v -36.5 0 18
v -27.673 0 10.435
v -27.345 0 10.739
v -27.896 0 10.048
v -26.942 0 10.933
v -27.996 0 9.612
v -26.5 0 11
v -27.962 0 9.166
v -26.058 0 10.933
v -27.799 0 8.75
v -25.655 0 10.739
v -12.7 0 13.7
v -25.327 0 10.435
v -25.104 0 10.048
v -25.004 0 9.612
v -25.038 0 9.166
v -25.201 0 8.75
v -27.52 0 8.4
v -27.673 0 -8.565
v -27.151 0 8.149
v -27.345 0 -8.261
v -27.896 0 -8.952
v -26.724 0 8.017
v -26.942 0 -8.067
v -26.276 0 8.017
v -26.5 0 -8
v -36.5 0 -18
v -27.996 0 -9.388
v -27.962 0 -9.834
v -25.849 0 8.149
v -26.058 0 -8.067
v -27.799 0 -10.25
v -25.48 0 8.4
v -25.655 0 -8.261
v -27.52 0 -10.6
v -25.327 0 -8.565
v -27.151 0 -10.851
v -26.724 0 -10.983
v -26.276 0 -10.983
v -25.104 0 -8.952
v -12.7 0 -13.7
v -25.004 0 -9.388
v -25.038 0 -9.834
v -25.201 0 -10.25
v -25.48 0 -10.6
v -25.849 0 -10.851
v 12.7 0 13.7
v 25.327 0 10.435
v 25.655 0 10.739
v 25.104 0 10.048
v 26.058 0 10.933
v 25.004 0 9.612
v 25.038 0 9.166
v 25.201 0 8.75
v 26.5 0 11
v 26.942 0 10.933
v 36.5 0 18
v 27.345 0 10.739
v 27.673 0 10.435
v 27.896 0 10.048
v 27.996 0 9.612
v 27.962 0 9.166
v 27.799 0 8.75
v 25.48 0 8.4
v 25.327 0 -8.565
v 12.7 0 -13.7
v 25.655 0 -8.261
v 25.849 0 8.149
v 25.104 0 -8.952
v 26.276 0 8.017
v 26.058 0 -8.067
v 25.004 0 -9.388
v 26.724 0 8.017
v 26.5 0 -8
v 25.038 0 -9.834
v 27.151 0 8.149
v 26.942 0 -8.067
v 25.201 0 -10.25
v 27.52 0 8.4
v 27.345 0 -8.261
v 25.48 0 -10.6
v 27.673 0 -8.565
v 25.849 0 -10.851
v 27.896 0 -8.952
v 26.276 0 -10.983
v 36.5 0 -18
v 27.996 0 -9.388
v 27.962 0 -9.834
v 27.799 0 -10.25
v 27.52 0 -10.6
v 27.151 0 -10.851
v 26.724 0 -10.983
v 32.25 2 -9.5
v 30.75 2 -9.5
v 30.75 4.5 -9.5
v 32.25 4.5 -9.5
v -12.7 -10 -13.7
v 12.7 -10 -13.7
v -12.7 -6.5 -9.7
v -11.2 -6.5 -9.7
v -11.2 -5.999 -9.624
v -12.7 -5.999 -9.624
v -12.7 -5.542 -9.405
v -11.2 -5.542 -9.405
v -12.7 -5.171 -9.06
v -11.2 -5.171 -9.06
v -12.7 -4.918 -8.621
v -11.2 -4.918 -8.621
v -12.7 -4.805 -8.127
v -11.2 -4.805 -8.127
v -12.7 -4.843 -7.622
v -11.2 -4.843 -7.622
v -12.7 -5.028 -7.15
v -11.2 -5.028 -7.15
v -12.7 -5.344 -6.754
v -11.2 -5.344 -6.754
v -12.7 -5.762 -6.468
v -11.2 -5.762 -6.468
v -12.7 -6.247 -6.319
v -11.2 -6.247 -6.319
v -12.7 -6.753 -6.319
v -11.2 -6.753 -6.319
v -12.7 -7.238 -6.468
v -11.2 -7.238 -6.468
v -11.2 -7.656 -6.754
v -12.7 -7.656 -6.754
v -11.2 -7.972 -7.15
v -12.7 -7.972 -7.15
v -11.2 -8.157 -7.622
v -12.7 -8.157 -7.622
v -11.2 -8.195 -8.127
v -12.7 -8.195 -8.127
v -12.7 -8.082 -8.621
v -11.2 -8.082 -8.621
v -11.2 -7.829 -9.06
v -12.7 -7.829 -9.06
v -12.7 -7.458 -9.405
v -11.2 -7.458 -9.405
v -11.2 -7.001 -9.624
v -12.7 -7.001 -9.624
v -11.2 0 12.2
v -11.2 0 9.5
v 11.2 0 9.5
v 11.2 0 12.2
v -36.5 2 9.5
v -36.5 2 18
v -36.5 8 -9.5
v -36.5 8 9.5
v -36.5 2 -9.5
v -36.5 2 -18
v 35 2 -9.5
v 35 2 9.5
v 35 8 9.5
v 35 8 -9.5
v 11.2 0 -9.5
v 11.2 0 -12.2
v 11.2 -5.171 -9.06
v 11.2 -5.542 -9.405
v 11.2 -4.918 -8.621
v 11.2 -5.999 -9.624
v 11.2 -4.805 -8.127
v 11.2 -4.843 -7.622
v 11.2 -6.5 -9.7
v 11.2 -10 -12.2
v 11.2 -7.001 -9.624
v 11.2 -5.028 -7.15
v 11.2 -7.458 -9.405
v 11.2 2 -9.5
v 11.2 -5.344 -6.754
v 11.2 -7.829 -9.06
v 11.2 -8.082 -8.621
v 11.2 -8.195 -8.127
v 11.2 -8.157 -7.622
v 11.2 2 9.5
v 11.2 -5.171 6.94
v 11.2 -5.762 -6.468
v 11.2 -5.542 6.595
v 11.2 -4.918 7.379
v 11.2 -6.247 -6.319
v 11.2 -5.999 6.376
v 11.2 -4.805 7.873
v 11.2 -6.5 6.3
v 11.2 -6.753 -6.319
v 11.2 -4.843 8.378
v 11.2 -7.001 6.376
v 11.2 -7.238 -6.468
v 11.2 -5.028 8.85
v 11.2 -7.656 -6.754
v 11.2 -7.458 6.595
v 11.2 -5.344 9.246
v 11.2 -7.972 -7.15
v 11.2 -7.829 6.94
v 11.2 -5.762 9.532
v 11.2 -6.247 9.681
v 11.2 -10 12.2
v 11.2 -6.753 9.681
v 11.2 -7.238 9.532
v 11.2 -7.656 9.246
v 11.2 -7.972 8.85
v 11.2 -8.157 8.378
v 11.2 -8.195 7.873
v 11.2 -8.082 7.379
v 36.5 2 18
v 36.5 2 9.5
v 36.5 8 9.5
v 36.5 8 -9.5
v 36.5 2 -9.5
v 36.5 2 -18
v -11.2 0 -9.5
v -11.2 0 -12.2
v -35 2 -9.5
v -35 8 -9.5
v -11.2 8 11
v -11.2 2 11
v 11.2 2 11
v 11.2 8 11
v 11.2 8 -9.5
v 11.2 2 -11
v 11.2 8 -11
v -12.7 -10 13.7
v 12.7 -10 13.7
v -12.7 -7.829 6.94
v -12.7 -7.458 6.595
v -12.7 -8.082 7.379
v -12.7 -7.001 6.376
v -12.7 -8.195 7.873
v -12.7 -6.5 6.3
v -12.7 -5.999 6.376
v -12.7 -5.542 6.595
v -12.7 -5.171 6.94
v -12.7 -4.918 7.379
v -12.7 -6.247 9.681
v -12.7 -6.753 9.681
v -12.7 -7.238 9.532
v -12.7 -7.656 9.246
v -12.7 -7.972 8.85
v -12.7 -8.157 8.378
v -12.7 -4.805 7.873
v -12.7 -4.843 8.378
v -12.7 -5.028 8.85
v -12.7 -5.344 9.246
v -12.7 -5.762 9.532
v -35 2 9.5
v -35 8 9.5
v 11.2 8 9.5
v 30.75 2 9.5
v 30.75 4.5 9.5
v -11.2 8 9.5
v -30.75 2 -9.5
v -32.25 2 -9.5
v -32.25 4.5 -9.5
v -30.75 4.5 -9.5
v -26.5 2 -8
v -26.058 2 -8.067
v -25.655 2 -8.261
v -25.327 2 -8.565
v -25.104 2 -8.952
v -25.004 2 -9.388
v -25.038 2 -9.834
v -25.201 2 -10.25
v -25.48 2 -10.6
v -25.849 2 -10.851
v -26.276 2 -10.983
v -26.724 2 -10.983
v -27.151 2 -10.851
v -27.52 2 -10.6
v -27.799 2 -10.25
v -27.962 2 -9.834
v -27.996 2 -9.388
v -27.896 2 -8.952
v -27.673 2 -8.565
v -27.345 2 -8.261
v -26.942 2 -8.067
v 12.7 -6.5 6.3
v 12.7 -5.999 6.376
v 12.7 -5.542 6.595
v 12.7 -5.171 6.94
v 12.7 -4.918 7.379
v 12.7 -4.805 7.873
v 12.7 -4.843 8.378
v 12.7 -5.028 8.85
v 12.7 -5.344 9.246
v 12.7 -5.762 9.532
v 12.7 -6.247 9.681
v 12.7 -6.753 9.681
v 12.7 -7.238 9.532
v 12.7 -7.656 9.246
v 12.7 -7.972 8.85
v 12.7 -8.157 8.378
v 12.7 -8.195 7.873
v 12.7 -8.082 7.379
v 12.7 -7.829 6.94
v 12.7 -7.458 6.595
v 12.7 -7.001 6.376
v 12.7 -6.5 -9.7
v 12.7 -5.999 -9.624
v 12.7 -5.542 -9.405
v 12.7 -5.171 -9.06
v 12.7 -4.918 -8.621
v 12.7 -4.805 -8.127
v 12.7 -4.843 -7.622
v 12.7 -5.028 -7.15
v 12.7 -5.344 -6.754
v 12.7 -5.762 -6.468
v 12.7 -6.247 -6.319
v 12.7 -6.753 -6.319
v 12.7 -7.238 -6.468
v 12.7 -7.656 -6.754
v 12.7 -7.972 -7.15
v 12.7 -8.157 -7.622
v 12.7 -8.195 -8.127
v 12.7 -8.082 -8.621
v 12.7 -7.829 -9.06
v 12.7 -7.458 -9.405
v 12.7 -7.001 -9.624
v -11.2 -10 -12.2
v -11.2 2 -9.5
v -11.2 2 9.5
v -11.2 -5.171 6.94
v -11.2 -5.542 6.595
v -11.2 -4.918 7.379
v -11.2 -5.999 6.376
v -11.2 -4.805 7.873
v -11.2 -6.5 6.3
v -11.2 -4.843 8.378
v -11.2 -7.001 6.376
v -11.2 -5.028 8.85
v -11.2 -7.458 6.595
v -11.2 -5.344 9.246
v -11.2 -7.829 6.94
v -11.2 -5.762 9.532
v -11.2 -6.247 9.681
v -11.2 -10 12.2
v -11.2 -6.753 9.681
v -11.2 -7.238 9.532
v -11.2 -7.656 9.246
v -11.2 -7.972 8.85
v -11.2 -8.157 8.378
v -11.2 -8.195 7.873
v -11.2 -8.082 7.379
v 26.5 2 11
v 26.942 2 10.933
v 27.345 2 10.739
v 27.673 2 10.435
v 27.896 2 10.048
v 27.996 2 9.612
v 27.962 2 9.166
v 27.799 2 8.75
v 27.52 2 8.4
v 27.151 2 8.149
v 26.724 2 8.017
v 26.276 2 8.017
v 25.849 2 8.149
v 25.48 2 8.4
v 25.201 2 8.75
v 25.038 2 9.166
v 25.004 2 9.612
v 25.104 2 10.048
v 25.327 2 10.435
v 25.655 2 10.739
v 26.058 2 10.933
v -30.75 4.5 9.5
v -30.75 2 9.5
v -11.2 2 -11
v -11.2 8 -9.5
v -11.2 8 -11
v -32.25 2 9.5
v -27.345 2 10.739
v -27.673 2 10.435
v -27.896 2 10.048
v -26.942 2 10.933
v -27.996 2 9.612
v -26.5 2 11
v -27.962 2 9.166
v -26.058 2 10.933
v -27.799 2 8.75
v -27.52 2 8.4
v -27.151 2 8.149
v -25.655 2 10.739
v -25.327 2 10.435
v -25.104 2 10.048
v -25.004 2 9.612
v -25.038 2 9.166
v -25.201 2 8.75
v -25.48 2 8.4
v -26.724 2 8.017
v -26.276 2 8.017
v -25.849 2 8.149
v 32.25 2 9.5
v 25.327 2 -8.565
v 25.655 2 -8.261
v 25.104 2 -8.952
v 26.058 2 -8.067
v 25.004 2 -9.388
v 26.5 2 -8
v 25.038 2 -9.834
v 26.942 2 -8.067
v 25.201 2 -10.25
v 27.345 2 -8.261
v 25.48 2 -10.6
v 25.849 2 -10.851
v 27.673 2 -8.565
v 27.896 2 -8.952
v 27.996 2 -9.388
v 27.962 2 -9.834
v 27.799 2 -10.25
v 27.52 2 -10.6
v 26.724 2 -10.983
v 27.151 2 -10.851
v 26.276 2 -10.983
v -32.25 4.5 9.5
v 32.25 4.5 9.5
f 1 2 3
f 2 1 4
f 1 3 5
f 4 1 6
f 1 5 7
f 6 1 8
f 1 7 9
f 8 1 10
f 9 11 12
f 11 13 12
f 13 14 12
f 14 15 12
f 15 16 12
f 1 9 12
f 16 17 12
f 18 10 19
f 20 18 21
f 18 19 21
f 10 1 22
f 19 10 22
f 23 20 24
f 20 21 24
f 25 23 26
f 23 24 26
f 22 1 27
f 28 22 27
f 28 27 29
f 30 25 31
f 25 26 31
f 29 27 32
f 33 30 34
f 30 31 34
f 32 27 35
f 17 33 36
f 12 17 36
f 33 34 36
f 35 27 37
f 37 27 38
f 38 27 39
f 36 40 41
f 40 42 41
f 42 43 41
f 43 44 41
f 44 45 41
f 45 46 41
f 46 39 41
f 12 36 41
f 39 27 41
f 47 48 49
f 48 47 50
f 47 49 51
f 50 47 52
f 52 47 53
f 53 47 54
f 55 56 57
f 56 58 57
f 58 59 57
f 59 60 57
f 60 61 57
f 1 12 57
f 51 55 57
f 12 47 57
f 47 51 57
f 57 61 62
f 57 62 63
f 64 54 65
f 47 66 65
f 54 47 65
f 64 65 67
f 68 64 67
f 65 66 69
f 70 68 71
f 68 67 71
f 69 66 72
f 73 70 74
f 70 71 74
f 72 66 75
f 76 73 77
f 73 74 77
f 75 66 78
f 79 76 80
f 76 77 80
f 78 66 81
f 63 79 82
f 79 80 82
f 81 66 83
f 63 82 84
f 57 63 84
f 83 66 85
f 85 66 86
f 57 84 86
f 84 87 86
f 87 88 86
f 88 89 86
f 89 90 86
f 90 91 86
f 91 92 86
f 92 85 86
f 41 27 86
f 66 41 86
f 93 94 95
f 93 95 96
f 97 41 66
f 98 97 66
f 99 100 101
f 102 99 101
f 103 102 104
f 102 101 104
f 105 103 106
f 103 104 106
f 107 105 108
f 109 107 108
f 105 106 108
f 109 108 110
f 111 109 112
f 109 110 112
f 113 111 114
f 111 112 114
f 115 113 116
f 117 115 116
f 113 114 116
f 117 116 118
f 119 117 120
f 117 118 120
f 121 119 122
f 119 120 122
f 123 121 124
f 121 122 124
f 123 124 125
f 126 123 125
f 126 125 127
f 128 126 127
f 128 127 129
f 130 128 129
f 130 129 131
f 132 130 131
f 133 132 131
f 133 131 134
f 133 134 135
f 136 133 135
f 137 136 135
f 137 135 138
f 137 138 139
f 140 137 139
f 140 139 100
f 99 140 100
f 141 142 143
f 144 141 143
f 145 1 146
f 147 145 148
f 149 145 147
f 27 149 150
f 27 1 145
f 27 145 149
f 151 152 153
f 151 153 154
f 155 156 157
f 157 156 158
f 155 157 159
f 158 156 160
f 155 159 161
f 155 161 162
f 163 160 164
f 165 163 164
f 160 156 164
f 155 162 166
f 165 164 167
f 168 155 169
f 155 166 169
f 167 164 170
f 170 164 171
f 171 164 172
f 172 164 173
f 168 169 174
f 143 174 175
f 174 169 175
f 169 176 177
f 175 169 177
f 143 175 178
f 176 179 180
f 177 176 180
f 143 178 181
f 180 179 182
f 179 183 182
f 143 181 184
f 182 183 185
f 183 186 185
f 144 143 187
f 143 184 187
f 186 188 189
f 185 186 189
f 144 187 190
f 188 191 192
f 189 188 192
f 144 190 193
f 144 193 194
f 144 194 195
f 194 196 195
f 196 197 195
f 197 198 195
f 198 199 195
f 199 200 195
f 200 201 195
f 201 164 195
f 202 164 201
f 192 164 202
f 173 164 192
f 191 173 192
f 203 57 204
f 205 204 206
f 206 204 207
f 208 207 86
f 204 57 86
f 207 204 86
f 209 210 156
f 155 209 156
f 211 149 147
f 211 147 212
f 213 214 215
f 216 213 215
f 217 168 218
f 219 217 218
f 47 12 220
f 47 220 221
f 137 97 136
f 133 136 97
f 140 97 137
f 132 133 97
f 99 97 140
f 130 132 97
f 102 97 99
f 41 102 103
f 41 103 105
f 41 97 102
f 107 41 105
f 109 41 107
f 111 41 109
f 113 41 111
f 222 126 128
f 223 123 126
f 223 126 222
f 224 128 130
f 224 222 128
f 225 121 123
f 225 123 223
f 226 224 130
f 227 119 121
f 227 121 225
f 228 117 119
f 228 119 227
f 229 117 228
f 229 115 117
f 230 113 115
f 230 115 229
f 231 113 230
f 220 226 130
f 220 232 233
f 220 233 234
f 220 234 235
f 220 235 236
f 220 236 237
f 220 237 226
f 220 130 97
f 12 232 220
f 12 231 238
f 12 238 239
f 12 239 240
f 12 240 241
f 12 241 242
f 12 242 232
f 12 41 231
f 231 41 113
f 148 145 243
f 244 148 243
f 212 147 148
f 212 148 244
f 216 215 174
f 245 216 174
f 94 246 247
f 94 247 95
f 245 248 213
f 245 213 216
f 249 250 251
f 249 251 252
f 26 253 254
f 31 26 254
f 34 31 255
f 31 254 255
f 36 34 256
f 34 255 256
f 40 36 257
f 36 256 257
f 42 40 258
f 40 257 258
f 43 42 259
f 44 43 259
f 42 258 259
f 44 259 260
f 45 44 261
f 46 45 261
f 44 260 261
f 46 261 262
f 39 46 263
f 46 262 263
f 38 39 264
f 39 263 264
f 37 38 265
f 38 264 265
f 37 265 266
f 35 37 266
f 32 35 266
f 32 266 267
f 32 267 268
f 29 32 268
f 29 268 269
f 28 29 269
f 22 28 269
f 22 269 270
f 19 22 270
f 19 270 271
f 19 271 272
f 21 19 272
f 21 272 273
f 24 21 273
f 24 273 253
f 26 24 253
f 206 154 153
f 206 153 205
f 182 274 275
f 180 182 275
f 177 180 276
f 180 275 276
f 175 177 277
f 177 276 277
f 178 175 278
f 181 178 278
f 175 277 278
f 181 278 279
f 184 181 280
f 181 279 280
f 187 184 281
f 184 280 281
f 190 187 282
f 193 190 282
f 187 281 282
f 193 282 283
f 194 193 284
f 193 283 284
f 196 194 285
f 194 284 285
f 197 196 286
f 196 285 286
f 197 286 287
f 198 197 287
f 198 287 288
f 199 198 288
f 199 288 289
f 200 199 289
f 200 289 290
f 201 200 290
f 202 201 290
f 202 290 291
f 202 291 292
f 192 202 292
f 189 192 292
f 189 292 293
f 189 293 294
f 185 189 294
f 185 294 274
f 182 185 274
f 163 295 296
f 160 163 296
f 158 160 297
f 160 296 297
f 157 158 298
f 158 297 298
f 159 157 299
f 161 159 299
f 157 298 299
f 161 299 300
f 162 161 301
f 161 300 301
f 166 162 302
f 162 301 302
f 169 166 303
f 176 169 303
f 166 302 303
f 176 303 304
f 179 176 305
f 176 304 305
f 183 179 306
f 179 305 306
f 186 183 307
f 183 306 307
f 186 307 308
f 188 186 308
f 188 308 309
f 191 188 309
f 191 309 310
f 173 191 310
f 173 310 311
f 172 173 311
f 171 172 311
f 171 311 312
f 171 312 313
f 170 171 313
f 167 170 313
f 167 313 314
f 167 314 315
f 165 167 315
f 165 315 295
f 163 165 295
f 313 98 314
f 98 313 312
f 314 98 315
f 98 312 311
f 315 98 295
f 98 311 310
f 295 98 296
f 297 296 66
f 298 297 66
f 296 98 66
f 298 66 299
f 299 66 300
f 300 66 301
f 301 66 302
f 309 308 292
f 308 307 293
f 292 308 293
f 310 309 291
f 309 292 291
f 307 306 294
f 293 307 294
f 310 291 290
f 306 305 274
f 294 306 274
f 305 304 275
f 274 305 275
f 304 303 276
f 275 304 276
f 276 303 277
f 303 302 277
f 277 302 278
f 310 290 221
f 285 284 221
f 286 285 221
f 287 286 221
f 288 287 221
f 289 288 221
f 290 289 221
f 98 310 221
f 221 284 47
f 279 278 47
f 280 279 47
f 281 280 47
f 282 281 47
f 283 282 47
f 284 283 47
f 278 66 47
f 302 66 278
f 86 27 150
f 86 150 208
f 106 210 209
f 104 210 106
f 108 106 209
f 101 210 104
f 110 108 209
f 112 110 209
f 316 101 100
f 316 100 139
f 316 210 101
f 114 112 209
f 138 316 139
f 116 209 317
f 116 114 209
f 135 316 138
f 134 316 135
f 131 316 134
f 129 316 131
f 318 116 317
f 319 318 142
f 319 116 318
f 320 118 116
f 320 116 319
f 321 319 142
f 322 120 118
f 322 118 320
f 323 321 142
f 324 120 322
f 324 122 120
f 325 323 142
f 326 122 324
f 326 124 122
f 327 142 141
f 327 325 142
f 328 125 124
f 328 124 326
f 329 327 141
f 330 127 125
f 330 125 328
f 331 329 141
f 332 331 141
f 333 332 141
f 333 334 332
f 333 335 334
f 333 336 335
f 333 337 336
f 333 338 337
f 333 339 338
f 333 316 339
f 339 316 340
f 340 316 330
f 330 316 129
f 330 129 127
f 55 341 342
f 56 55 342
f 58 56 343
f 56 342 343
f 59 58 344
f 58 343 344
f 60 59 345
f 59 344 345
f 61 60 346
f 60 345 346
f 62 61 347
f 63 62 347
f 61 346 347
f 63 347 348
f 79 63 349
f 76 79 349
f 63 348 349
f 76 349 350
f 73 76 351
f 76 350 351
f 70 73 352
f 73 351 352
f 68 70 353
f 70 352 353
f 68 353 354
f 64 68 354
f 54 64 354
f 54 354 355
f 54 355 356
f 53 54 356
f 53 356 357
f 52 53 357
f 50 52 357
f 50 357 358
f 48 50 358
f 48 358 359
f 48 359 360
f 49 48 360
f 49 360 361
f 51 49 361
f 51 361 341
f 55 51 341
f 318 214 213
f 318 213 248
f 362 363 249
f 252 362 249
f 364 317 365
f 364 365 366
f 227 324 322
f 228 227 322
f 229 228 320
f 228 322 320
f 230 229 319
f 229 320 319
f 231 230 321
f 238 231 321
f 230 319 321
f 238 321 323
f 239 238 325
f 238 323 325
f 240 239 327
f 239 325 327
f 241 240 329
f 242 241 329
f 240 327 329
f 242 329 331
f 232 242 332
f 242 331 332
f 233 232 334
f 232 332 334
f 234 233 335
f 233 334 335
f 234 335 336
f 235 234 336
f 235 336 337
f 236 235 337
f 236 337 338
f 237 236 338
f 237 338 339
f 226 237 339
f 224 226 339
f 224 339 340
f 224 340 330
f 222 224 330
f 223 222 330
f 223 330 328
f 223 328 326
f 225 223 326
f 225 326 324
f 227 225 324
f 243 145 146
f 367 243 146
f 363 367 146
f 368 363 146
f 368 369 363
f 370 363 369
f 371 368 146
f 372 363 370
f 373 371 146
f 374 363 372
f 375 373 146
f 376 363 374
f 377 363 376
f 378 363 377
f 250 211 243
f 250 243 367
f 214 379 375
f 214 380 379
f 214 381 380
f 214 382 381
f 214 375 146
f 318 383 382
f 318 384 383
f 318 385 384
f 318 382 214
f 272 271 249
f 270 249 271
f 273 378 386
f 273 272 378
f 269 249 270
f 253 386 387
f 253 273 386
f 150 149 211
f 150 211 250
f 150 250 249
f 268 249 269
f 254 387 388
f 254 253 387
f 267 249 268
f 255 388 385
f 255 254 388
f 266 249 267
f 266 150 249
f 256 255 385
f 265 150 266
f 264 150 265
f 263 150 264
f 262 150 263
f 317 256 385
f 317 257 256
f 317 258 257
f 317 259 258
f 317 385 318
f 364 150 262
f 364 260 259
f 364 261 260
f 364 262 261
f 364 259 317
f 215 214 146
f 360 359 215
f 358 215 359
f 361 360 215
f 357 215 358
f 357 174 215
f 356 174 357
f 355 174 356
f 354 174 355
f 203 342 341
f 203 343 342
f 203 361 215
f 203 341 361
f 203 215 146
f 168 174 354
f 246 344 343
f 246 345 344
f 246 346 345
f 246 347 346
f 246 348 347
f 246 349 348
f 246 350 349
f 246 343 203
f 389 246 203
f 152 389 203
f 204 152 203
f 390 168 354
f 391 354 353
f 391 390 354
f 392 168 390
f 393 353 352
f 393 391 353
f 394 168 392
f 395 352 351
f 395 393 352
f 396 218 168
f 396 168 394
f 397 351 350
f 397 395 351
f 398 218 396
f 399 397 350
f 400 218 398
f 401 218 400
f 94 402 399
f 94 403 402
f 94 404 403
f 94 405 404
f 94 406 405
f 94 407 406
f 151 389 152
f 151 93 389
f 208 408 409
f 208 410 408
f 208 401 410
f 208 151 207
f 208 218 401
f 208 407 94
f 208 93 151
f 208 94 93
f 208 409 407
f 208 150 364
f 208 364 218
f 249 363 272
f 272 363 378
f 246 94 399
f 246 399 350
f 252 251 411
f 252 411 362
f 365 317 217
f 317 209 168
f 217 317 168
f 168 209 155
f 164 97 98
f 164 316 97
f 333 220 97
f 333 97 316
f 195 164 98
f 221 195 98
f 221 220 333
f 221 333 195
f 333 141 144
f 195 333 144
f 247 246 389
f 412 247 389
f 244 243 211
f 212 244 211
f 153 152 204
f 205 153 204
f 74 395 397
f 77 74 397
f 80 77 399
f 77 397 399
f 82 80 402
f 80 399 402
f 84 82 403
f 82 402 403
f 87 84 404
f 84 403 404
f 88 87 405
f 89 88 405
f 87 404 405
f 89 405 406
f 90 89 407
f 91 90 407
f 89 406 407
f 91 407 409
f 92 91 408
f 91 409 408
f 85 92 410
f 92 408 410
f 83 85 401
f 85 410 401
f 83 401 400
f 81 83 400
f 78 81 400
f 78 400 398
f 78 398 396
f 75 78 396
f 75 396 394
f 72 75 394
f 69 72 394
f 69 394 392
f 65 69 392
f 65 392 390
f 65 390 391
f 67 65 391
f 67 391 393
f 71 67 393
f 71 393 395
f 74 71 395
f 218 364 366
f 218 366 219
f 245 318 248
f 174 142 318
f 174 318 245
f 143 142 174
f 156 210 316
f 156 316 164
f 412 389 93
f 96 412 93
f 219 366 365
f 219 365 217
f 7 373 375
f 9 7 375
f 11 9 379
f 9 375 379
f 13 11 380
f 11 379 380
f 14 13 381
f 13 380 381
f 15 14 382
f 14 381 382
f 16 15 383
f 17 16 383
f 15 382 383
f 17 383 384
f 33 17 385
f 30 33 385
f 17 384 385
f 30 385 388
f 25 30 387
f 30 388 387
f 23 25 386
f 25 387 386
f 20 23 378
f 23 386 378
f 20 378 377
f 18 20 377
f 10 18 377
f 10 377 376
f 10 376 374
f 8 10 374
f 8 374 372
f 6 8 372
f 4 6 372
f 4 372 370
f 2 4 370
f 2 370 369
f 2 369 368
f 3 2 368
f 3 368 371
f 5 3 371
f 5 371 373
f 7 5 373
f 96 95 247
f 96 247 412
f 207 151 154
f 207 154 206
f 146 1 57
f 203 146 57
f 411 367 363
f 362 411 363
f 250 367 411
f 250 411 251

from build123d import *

# Parameters (mm, degrees)
SKETCH1_W           = 73
SKETCH1_H           = 36
BOSS_EXTRUDE1_DEPTH = 2
SKETCH2_W           = 1.5
SKETCH2_H           = 19
BOSS_EXTRUDE2_DEPTH = 6
SKETCH3_W           = 25.4
SKETCH3_H           = 27.4
SKETCH3_W_2         = 22.4
SKETCH3_H_2         = 24.4
BOSS_EXTRUDE3_DEPTH = 10
SKETCH4_W           = 22.4
SKETCH4_H           = 19
CUT_EXTRUDE1_DEPTH  = 42.907636536
SKETCH5_W           = 22.4
SKETCH5_H           = 1.5
BOSS_EXTRUDE4_DEPTH = 6
SKETCH6_R           = 1.5
CUT_EXTRUDE2_DEPTH  = 43.429353047
SKETCH7_W           = 1.5
SKETCH7_H           = 19
BOSS_EXTRUDE5_DEPTH = 2.5
SKETCH8_R           = 1.7
CUT_EXTRUDE3_DEPTH  = 54.335166635


with BuildPart() as part:
    # Sketch1 → Boss-Extrude1 (new body)
    with BuildSketch(Plane(origin=(0, 0, 0), x_dir=(1, 0, 0), z_dir=(0, 1, 0))):
        Rectangle(SKETCH1_W, SKETCH1_H)
    extrude(amount=BOSS_EXTRUDE1_DEPTH)

    # Sketch2 → Boss-Extrude2 (add)
    with BuildSketch(Plane(origin=(0, 2, 0), x_dir=(1, 0, 0), z_dir=(0, 1, 0))):
        with Locations((-35.75, 0)):
            Rectangle(SKETCH2_W, SKETCH2_H)
        with Locations((35.75, 0)):
            Rectangle(SKETCH2_W, SKETCH2_H)
    extrude(amount=BOSS_EXTRUDE2_DEPTH)

    # Sketch3 → Boss-Extrude3 (add)
    with BuildSketch(Plane.XZ):
        Rectangle(SKETCH3_W, SKETCH3_H)
        Rectangle(SKETCH3_W_2, SKETCH3_H_2, mode=Mode.SUBTRACT)
    extrude(amount=BOSS_EXTRUDE3_DEPTH)

    # Sketch4 → Cut-Extrude1 (cut, through all)
    with BuildSketch(Plane.XZ):
        Rectangle(SKETCH4_W, SKETCH4_H)
    extrude(amount=-CUT_EXTRUDE1_DEPTH, mode=Mode.SUBTRACT)

    # Sketch5 → Boss-Extrude4 (add)
    with BuildSketch(Plane(origin=(0, 2, 0), x_dir=(1, 0, 0), z_dir=(0, 1, 0))):
        with Locations((0, 10.25)):
            Rectangle(SKETCH5_W, SKETCH5_H)
        with Locations((0, -10.25)):
            Rectangle(SKETCH5_W, SKETCH5_H)
    extrude(amount=BOSS_EXTRUDE4_DEPTH)

    # Sketch6 → Cut-Extrude2 (cut, through all)
    with BuildSketch(Plane(origin=(0, 2, 0), x_dir=(1, 0, 0), z_dir=(0, 1, 0))):
        with Locations(Location((-26.5, 9.5, 0), (0, 0, 270))):
            Circle(SKETCH6_R)
        with Locations(Location((-26.5, -9.5, 0), (0, 0, 270))):
            Circle(SKETCH6_R)
        with Locations(Location((26.5, 9.5, 0), (0, 0, 270))):
            Circle(SKETCH6_R)
        with Locations(Location((26.5, -9.5, 0), (0, 0, 270))):
            Circle(SKETCH6_R)
    extrude(amount=-CUT_EXTRUDE2_DEPTH, mode=Mode.SUBTRACT)

    # Sketch7 → Boss-Extrude5 (add)
    with BuildSketch(Plane(origin=(0, 2, 0), x_dir=(1, 0, 0), z_dir=(0, 1, 0))):
        with Locations((-31.5, 0)):
            Rectangle(SKETCH7_W, SKETCH7_H)
        with Locations((31.5, 0)):
            Rectangle(SKETCH7_W, SKETCH7_H)
    extrude(amount=BOSS_EXTRUDE5_DEPTH)

    # Sketch8 → Cut-Extrude3 (cut, through all)
    with BuildSketch(Plane(origin=(12.7, 0, 0), x_dir=(0, 0, -1), z_dir=(1, 0, 0))):
        with Locations((-8, -6.5)):
            Circle(SKETCH8_R)
        with Locations((8, -6.5)):
            Circle(SKETCH8_R)
    extrude(amount=-CUT_EXTRUDE3_DEPTH, mode=Mode.SUBTRACT)


solid = part.part
